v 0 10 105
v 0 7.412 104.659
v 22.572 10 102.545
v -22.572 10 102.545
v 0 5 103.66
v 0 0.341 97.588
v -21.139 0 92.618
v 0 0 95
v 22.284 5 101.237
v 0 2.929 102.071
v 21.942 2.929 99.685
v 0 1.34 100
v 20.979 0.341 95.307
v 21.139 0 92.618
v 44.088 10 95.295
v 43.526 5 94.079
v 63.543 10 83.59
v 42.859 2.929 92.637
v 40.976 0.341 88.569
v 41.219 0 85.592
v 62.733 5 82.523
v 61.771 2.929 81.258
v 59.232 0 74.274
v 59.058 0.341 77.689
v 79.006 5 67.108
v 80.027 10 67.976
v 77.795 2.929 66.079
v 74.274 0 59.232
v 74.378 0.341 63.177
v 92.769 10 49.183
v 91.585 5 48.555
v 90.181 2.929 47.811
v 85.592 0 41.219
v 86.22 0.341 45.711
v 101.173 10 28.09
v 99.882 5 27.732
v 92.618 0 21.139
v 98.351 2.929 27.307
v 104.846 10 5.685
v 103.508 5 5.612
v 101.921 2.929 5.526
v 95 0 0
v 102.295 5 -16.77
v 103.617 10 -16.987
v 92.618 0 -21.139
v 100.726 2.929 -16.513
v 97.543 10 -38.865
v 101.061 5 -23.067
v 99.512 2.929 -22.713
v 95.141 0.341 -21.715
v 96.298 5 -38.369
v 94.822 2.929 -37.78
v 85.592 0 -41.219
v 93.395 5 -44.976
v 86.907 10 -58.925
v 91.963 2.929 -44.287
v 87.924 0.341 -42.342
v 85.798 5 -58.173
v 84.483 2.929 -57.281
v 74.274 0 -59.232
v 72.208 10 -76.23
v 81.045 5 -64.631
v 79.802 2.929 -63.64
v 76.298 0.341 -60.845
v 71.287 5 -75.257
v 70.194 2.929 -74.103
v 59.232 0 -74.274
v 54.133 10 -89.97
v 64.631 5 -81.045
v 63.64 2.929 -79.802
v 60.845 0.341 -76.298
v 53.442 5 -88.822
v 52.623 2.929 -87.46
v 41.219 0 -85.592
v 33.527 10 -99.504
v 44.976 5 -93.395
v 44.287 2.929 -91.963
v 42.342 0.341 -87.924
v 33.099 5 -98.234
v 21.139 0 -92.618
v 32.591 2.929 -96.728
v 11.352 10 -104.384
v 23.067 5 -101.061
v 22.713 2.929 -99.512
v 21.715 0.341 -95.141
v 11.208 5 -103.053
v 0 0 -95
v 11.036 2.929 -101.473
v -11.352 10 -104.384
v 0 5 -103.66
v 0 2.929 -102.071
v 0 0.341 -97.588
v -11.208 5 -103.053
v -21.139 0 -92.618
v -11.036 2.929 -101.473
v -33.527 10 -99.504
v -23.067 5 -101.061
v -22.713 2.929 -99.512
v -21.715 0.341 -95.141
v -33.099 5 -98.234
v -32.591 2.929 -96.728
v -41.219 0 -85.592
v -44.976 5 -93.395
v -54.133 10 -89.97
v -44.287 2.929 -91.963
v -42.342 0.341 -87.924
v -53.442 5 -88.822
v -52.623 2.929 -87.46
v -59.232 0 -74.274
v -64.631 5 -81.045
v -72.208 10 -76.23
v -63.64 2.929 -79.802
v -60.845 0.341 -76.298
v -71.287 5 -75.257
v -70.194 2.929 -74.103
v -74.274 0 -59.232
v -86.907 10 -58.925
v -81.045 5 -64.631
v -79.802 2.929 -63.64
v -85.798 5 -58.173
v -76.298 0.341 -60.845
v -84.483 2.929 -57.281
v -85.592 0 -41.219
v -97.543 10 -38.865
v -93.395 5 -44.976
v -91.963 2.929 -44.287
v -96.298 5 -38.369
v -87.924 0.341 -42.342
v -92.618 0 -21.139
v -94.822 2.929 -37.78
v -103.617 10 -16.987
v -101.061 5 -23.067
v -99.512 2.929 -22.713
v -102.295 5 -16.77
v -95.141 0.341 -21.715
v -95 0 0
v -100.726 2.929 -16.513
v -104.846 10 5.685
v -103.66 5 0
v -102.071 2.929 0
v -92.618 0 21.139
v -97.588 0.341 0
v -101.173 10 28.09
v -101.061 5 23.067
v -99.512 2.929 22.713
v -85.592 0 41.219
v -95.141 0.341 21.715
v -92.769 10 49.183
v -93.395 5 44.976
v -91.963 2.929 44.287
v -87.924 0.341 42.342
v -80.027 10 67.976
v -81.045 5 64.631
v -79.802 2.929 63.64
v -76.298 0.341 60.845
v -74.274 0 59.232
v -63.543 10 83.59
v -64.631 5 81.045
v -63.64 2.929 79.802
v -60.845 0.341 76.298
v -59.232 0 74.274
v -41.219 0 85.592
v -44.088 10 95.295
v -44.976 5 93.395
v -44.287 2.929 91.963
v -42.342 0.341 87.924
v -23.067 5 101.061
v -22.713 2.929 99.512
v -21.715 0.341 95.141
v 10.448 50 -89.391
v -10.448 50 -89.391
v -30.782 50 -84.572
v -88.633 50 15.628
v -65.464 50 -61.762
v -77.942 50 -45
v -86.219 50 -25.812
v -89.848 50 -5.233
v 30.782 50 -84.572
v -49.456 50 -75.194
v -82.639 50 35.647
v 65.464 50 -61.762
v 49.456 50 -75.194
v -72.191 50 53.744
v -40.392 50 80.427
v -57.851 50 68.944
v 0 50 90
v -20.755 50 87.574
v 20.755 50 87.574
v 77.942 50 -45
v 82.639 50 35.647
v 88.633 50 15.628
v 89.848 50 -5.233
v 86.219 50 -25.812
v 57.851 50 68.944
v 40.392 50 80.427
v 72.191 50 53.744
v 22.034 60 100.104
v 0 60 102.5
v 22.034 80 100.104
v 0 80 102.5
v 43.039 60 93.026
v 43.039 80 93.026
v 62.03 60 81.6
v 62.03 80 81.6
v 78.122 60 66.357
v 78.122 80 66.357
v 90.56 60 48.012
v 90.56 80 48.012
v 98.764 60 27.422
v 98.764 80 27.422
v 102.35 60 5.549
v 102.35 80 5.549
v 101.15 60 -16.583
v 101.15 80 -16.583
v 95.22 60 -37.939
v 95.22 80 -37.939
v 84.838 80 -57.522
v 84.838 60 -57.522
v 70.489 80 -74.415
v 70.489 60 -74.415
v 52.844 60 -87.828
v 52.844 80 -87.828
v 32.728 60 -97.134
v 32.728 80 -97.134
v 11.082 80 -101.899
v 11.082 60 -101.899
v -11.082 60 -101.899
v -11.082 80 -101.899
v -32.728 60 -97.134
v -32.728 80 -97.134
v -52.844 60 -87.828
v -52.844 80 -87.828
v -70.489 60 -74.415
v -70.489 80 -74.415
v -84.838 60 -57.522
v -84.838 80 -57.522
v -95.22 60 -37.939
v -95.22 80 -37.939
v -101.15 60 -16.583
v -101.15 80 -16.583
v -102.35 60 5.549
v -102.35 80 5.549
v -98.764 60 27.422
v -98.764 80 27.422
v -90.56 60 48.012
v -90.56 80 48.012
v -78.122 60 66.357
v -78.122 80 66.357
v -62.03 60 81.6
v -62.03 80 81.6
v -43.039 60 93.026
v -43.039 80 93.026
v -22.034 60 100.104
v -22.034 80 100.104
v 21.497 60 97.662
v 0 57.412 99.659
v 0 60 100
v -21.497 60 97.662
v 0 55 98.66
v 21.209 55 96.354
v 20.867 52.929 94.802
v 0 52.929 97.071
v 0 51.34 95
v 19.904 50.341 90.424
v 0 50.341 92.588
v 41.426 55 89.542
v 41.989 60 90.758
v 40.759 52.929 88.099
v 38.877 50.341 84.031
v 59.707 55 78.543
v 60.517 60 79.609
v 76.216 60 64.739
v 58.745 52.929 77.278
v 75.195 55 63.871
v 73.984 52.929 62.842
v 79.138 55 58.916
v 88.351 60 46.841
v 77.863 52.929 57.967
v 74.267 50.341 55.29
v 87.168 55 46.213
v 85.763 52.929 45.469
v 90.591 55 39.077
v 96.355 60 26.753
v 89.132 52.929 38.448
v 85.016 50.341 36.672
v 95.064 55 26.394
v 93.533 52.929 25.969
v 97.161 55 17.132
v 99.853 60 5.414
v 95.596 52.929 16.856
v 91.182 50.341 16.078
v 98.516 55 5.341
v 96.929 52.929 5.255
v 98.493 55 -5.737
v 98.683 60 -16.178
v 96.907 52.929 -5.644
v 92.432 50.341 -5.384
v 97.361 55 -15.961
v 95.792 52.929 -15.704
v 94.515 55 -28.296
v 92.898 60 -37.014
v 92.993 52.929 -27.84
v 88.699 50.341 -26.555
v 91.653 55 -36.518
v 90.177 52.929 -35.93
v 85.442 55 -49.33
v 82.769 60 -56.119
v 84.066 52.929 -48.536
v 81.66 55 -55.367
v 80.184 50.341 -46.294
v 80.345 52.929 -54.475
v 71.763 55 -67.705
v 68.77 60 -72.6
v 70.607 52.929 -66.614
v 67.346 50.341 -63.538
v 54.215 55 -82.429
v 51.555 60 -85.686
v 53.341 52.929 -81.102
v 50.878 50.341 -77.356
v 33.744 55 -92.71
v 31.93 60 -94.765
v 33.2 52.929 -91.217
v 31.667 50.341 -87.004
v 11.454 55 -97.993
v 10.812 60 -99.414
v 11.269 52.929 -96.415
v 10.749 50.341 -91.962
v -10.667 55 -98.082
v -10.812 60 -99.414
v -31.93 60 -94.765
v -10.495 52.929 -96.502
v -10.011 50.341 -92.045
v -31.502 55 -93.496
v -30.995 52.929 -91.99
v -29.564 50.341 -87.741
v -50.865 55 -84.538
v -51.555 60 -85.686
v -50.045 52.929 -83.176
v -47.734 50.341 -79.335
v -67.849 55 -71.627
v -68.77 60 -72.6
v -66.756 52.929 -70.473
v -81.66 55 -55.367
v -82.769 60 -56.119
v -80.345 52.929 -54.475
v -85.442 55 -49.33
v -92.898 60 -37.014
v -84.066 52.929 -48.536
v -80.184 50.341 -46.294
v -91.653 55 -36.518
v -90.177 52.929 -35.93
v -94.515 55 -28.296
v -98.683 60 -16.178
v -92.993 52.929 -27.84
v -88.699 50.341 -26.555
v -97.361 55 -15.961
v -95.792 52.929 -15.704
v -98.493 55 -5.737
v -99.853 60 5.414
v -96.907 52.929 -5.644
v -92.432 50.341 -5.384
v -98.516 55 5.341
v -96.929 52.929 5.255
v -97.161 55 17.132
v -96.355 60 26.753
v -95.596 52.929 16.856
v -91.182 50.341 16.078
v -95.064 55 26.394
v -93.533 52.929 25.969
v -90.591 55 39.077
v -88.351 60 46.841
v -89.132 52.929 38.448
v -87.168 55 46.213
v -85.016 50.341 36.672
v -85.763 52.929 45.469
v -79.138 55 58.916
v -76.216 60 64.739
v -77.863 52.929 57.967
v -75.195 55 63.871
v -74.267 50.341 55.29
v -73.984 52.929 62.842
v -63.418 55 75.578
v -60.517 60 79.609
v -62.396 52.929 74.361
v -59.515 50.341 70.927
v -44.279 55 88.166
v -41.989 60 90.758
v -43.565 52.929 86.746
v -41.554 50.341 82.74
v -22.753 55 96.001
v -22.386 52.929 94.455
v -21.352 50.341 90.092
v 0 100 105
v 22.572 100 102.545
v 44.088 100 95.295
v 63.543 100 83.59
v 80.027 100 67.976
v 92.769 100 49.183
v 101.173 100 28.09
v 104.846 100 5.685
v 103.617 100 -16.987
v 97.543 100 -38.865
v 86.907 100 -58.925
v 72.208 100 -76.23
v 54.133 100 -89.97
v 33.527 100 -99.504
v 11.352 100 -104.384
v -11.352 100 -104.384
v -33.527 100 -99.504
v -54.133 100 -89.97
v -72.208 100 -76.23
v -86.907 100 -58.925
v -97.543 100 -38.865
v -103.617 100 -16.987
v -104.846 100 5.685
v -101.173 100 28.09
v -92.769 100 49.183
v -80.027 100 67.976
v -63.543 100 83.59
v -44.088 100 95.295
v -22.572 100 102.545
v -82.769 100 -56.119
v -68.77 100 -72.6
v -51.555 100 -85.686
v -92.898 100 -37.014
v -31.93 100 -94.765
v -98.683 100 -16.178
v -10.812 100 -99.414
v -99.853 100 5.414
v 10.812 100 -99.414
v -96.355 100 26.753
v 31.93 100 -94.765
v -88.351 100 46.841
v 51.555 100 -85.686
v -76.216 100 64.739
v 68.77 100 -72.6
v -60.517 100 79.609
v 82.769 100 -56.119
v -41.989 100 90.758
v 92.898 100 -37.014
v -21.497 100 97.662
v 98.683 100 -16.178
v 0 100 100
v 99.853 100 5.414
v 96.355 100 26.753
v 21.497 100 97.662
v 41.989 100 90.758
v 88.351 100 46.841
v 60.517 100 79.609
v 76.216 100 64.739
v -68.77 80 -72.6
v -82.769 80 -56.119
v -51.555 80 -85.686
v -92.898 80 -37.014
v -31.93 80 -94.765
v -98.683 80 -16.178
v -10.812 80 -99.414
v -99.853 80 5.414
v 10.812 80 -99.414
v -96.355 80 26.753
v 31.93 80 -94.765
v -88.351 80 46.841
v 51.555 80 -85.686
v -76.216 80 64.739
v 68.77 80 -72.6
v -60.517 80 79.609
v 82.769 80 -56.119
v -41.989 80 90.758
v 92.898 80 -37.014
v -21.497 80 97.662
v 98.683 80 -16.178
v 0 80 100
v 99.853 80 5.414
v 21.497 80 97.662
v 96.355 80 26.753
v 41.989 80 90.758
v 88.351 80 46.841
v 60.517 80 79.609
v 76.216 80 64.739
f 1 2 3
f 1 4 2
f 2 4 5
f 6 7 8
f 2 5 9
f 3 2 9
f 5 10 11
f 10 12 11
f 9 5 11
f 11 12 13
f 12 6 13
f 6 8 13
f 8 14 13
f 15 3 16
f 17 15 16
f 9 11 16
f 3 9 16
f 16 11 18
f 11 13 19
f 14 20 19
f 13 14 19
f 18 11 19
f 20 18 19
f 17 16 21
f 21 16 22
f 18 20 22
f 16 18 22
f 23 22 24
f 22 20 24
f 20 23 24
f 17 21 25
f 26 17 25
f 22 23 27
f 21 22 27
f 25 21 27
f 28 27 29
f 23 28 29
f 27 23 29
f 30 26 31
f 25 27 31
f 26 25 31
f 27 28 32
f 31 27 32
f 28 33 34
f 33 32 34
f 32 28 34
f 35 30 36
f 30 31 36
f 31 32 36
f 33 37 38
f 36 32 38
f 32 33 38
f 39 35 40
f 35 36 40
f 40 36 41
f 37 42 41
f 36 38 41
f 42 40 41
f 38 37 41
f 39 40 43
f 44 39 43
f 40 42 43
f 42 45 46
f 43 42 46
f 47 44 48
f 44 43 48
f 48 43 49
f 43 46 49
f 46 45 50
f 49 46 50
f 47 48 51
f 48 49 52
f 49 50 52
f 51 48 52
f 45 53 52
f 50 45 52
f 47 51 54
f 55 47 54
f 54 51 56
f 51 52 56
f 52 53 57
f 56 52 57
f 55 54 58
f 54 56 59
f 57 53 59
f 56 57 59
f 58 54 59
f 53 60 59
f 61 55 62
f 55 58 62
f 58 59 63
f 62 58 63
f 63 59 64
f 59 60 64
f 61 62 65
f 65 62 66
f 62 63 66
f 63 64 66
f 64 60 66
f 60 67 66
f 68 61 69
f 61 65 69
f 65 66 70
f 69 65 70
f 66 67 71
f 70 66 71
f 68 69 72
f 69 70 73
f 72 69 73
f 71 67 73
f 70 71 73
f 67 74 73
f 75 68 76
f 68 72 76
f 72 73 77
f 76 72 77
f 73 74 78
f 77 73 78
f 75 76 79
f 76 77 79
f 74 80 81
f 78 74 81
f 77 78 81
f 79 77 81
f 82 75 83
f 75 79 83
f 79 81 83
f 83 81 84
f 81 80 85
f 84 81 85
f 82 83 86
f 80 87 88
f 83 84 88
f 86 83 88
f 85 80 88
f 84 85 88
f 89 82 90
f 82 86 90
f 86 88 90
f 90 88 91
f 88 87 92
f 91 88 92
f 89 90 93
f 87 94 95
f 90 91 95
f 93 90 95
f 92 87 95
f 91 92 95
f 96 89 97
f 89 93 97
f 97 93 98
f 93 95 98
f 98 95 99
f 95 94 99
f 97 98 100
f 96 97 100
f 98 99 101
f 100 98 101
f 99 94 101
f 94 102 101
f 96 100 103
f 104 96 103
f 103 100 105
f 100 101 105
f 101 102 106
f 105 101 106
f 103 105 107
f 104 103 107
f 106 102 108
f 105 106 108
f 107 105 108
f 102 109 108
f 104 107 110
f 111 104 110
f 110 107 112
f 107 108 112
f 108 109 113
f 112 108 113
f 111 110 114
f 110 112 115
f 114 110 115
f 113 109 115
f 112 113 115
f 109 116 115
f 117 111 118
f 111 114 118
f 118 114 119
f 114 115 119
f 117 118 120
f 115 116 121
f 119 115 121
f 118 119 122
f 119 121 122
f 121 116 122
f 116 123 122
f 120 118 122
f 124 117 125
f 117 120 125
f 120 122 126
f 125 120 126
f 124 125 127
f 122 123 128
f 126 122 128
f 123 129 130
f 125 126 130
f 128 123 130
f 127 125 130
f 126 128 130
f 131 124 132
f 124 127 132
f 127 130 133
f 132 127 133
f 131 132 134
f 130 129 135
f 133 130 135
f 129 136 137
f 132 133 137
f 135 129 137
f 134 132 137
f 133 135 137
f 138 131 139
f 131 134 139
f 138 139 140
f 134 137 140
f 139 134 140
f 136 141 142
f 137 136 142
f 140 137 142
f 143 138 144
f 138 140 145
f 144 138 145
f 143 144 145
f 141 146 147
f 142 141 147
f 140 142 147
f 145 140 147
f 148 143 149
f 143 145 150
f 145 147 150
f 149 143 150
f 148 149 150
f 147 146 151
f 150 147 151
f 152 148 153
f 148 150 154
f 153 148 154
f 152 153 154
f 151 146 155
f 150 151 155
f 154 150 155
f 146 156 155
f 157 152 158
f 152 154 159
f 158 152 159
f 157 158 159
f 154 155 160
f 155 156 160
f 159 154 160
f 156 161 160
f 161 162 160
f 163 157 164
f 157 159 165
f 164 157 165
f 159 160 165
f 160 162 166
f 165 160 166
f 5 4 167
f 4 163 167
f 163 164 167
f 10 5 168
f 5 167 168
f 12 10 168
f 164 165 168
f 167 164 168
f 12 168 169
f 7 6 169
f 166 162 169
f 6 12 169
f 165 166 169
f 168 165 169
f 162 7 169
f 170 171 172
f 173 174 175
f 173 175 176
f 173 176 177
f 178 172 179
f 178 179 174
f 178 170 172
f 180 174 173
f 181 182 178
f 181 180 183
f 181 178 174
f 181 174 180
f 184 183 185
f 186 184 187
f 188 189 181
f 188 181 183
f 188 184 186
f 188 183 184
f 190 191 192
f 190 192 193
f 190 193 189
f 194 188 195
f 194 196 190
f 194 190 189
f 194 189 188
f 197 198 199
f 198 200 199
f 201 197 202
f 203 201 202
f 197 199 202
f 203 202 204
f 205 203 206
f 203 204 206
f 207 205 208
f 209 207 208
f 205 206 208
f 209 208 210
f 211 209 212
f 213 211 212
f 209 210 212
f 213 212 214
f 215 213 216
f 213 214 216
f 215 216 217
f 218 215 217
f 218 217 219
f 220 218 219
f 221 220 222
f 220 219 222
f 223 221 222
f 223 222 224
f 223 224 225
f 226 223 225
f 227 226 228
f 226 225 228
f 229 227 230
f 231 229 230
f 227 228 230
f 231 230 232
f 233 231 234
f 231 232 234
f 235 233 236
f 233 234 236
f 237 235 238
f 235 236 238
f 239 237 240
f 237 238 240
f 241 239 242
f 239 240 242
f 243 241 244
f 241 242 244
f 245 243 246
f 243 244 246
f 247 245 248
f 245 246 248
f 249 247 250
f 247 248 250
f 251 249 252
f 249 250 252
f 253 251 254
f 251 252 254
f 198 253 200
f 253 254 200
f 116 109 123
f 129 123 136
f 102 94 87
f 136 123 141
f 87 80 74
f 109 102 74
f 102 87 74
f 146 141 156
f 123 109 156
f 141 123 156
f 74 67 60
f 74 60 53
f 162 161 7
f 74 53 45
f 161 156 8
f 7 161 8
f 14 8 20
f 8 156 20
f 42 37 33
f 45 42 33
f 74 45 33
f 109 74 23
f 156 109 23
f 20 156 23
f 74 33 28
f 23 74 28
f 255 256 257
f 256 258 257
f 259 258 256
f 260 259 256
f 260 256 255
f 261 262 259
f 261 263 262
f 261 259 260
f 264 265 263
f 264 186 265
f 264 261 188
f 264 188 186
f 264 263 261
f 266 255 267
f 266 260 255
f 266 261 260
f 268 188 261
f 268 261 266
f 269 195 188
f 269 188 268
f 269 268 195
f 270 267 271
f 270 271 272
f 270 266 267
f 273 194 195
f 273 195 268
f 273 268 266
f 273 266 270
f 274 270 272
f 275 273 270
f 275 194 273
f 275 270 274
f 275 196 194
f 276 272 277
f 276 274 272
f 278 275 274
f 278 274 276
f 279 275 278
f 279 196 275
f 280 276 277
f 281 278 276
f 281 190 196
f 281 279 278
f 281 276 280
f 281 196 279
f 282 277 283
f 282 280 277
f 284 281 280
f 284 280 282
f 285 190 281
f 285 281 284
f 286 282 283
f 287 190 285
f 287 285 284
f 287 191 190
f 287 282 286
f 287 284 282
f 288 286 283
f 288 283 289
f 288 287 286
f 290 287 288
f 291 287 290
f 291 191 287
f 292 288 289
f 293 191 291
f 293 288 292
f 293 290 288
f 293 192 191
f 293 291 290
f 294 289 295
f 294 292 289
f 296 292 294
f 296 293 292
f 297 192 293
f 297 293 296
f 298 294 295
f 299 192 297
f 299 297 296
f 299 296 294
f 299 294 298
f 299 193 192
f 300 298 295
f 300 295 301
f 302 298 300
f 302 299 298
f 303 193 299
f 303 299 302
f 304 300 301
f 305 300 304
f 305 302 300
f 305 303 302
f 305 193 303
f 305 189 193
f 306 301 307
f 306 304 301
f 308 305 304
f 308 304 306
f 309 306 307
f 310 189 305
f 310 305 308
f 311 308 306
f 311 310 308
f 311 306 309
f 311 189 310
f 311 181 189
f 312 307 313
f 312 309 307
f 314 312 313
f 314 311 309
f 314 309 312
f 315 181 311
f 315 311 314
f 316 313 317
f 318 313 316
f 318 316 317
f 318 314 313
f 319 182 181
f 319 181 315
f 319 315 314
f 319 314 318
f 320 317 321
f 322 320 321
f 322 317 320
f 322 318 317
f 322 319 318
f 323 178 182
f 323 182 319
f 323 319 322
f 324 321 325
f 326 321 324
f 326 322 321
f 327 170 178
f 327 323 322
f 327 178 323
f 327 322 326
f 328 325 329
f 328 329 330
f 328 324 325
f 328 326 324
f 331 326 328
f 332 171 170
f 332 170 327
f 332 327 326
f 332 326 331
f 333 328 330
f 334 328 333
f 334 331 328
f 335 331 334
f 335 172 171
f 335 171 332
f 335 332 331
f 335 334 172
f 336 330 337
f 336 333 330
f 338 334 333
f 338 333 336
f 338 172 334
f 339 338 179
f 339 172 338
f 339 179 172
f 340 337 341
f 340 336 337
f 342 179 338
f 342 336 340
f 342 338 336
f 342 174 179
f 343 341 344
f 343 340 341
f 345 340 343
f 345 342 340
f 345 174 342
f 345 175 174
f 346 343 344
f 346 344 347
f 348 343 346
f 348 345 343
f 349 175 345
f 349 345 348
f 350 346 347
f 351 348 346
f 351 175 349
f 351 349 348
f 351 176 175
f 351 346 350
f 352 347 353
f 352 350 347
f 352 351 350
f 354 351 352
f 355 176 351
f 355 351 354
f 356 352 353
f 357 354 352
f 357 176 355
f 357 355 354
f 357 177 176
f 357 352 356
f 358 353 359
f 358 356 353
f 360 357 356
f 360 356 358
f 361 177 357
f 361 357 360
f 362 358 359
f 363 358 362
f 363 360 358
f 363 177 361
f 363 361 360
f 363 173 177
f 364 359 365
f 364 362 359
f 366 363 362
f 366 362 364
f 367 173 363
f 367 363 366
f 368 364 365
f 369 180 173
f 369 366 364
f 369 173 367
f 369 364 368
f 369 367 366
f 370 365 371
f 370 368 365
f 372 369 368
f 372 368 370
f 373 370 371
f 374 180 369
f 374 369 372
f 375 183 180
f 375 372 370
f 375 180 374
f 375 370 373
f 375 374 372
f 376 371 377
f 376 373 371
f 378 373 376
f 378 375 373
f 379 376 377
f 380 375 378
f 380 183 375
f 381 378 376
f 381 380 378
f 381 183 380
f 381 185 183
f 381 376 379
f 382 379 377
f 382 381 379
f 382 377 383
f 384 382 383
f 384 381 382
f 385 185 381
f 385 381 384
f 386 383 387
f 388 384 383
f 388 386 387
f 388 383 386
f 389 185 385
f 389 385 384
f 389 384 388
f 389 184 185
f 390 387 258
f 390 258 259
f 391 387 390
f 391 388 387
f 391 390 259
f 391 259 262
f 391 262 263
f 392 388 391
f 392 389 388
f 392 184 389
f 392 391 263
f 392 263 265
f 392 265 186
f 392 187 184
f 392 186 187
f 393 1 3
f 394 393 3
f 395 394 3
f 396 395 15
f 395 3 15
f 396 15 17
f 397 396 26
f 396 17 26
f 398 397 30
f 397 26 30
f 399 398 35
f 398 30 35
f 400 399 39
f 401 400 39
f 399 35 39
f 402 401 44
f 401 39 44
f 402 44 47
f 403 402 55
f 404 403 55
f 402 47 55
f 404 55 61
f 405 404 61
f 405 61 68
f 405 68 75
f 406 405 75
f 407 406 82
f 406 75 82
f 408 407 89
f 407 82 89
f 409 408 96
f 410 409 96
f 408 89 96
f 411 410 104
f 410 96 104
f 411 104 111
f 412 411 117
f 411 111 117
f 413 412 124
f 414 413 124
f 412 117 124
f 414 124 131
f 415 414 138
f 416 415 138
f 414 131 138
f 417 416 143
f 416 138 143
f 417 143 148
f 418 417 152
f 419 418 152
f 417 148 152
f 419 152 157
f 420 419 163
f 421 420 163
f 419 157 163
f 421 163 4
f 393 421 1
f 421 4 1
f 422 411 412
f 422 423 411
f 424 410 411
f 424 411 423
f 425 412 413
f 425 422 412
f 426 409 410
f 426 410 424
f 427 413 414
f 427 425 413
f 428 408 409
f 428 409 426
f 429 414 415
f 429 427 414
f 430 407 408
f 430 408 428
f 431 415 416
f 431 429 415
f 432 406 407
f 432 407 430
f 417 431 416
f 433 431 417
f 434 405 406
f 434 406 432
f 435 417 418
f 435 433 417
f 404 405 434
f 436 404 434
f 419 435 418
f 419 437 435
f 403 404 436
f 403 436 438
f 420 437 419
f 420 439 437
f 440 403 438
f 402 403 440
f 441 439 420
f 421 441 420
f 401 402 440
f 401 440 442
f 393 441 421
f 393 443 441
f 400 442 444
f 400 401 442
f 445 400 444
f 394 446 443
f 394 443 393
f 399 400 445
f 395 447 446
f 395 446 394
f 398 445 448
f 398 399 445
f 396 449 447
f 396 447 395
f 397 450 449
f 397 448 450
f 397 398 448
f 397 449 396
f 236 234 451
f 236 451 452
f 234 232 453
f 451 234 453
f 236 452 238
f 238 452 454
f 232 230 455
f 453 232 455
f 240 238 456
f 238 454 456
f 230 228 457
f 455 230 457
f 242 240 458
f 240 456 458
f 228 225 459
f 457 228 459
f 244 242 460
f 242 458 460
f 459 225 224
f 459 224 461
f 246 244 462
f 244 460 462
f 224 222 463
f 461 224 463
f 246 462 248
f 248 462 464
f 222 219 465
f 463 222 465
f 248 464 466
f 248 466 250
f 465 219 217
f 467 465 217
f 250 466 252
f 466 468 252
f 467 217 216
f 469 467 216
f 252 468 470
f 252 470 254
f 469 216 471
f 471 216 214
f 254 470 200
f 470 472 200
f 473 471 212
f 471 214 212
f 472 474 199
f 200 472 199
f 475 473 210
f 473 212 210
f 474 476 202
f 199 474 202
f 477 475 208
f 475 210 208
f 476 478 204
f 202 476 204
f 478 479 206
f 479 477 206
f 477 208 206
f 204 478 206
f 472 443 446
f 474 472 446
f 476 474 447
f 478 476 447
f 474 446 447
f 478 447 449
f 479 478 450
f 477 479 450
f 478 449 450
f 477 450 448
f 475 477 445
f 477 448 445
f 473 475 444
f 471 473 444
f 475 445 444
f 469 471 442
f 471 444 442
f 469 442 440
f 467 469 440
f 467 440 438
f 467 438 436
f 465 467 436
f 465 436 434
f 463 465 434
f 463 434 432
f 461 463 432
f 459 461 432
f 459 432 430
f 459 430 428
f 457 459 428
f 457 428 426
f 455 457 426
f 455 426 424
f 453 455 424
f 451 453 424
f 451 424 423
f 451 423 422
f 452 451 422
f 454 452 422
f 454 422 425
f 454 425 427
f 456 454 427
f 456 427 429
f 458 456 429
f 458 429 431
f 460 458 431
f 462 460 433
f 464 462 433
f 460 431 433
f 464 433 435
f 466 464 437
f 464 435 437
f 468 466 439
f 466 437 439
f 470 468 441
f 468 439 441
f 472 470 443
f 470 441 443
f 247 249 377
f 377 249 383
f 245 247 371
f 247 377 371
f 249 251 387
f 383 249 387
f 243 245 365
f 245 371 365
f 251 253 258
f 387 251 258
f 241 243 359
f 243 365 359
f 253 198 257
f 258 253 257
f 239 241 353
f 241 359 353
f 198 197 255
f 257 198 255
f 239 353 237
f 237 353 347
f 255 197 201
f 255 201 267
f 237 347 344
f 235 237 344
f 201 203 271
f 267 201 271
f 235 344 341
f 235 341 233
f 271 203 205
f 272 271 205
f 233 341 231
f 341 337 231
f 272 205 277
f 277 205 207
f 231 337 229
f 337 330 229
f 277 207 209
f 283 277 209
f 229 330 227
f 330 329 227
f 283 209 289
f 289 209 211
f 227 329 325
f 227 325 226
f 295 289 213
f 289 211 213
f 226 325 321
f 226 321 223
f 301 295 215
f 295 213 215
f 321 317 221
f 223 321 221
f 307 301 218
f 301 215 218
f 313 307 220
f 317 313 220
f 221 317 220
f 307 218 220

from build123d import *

# Parameters (mm, degrees)
SKETCH1_R           = 105
BOSS_EXTRUDE2_DEPTH = 100
SKETCH2_R           = 100
CUT_EXTRUDE2_DEPTH  = 50
FILLET1_R           = 10
FILLET2_R           = 10


with BuildPart() as part:
    # Sketch1 → Boss-Extrude2 (new body)
    with BuildSketch(Plane(origin=(0, 0, 0), x_dir=(1, 0, 0), z_dir=(0, 1, 0))):
        with Locations(Location((0, 0, 0), (0, 0, 270))):
            Circle(SKETCH1_R)
    extrude(amount=BOSS_EXTRUDE2_DEPTH)

    # Sketch2 → Cut-Extrude2 (cut)
    with BuildSketch(Plane(origin=(0, 100, 0), x_dir=(1, 0, 0), z_dir=(0, 1, 0))):
        with Locations(Location((0, 0, 0), (0, 0, 270))):
            Circle(SKETCH2_R)
    extrude(amount=-CUT_EXTRUDE2_DEPTH, mode=Mode.SUBTRACT)

    # Fillet1
    fillet1_edges = [part.edges().sort_by_distance(p)[0] for p in [
        (0, 50, -100),
    ]]
    fillet(fillet1_edges, radius=FILLET1_R)

    # Fillet2
    fillet2_edges = [part.edges().sort_by_distance(p)[0] for p in [
        (0, 0, -105),
    ]]
    fillet(fillet2_edges, radius=FILLET2_R)

    # Sketch4 → Cut-Revolve1 (revolve, cut)
    with BuildSketch(Plane.XY, mode=Mode.PRIVATE) as cut_revolve1_sk:
        Polygon((0, 80), (0, 63), (0, 60), (102.5, 60), (102.5, 80), align=None)
    revolve(cut_revolve1_sk.sketch.rotate(Axis((0, 0, 0), (0, 1, 0)), 270), axis=Axis((0, 0, 0), (0, 1, 0)), mode=Mode.SUBTRACT)


solid = part.part
